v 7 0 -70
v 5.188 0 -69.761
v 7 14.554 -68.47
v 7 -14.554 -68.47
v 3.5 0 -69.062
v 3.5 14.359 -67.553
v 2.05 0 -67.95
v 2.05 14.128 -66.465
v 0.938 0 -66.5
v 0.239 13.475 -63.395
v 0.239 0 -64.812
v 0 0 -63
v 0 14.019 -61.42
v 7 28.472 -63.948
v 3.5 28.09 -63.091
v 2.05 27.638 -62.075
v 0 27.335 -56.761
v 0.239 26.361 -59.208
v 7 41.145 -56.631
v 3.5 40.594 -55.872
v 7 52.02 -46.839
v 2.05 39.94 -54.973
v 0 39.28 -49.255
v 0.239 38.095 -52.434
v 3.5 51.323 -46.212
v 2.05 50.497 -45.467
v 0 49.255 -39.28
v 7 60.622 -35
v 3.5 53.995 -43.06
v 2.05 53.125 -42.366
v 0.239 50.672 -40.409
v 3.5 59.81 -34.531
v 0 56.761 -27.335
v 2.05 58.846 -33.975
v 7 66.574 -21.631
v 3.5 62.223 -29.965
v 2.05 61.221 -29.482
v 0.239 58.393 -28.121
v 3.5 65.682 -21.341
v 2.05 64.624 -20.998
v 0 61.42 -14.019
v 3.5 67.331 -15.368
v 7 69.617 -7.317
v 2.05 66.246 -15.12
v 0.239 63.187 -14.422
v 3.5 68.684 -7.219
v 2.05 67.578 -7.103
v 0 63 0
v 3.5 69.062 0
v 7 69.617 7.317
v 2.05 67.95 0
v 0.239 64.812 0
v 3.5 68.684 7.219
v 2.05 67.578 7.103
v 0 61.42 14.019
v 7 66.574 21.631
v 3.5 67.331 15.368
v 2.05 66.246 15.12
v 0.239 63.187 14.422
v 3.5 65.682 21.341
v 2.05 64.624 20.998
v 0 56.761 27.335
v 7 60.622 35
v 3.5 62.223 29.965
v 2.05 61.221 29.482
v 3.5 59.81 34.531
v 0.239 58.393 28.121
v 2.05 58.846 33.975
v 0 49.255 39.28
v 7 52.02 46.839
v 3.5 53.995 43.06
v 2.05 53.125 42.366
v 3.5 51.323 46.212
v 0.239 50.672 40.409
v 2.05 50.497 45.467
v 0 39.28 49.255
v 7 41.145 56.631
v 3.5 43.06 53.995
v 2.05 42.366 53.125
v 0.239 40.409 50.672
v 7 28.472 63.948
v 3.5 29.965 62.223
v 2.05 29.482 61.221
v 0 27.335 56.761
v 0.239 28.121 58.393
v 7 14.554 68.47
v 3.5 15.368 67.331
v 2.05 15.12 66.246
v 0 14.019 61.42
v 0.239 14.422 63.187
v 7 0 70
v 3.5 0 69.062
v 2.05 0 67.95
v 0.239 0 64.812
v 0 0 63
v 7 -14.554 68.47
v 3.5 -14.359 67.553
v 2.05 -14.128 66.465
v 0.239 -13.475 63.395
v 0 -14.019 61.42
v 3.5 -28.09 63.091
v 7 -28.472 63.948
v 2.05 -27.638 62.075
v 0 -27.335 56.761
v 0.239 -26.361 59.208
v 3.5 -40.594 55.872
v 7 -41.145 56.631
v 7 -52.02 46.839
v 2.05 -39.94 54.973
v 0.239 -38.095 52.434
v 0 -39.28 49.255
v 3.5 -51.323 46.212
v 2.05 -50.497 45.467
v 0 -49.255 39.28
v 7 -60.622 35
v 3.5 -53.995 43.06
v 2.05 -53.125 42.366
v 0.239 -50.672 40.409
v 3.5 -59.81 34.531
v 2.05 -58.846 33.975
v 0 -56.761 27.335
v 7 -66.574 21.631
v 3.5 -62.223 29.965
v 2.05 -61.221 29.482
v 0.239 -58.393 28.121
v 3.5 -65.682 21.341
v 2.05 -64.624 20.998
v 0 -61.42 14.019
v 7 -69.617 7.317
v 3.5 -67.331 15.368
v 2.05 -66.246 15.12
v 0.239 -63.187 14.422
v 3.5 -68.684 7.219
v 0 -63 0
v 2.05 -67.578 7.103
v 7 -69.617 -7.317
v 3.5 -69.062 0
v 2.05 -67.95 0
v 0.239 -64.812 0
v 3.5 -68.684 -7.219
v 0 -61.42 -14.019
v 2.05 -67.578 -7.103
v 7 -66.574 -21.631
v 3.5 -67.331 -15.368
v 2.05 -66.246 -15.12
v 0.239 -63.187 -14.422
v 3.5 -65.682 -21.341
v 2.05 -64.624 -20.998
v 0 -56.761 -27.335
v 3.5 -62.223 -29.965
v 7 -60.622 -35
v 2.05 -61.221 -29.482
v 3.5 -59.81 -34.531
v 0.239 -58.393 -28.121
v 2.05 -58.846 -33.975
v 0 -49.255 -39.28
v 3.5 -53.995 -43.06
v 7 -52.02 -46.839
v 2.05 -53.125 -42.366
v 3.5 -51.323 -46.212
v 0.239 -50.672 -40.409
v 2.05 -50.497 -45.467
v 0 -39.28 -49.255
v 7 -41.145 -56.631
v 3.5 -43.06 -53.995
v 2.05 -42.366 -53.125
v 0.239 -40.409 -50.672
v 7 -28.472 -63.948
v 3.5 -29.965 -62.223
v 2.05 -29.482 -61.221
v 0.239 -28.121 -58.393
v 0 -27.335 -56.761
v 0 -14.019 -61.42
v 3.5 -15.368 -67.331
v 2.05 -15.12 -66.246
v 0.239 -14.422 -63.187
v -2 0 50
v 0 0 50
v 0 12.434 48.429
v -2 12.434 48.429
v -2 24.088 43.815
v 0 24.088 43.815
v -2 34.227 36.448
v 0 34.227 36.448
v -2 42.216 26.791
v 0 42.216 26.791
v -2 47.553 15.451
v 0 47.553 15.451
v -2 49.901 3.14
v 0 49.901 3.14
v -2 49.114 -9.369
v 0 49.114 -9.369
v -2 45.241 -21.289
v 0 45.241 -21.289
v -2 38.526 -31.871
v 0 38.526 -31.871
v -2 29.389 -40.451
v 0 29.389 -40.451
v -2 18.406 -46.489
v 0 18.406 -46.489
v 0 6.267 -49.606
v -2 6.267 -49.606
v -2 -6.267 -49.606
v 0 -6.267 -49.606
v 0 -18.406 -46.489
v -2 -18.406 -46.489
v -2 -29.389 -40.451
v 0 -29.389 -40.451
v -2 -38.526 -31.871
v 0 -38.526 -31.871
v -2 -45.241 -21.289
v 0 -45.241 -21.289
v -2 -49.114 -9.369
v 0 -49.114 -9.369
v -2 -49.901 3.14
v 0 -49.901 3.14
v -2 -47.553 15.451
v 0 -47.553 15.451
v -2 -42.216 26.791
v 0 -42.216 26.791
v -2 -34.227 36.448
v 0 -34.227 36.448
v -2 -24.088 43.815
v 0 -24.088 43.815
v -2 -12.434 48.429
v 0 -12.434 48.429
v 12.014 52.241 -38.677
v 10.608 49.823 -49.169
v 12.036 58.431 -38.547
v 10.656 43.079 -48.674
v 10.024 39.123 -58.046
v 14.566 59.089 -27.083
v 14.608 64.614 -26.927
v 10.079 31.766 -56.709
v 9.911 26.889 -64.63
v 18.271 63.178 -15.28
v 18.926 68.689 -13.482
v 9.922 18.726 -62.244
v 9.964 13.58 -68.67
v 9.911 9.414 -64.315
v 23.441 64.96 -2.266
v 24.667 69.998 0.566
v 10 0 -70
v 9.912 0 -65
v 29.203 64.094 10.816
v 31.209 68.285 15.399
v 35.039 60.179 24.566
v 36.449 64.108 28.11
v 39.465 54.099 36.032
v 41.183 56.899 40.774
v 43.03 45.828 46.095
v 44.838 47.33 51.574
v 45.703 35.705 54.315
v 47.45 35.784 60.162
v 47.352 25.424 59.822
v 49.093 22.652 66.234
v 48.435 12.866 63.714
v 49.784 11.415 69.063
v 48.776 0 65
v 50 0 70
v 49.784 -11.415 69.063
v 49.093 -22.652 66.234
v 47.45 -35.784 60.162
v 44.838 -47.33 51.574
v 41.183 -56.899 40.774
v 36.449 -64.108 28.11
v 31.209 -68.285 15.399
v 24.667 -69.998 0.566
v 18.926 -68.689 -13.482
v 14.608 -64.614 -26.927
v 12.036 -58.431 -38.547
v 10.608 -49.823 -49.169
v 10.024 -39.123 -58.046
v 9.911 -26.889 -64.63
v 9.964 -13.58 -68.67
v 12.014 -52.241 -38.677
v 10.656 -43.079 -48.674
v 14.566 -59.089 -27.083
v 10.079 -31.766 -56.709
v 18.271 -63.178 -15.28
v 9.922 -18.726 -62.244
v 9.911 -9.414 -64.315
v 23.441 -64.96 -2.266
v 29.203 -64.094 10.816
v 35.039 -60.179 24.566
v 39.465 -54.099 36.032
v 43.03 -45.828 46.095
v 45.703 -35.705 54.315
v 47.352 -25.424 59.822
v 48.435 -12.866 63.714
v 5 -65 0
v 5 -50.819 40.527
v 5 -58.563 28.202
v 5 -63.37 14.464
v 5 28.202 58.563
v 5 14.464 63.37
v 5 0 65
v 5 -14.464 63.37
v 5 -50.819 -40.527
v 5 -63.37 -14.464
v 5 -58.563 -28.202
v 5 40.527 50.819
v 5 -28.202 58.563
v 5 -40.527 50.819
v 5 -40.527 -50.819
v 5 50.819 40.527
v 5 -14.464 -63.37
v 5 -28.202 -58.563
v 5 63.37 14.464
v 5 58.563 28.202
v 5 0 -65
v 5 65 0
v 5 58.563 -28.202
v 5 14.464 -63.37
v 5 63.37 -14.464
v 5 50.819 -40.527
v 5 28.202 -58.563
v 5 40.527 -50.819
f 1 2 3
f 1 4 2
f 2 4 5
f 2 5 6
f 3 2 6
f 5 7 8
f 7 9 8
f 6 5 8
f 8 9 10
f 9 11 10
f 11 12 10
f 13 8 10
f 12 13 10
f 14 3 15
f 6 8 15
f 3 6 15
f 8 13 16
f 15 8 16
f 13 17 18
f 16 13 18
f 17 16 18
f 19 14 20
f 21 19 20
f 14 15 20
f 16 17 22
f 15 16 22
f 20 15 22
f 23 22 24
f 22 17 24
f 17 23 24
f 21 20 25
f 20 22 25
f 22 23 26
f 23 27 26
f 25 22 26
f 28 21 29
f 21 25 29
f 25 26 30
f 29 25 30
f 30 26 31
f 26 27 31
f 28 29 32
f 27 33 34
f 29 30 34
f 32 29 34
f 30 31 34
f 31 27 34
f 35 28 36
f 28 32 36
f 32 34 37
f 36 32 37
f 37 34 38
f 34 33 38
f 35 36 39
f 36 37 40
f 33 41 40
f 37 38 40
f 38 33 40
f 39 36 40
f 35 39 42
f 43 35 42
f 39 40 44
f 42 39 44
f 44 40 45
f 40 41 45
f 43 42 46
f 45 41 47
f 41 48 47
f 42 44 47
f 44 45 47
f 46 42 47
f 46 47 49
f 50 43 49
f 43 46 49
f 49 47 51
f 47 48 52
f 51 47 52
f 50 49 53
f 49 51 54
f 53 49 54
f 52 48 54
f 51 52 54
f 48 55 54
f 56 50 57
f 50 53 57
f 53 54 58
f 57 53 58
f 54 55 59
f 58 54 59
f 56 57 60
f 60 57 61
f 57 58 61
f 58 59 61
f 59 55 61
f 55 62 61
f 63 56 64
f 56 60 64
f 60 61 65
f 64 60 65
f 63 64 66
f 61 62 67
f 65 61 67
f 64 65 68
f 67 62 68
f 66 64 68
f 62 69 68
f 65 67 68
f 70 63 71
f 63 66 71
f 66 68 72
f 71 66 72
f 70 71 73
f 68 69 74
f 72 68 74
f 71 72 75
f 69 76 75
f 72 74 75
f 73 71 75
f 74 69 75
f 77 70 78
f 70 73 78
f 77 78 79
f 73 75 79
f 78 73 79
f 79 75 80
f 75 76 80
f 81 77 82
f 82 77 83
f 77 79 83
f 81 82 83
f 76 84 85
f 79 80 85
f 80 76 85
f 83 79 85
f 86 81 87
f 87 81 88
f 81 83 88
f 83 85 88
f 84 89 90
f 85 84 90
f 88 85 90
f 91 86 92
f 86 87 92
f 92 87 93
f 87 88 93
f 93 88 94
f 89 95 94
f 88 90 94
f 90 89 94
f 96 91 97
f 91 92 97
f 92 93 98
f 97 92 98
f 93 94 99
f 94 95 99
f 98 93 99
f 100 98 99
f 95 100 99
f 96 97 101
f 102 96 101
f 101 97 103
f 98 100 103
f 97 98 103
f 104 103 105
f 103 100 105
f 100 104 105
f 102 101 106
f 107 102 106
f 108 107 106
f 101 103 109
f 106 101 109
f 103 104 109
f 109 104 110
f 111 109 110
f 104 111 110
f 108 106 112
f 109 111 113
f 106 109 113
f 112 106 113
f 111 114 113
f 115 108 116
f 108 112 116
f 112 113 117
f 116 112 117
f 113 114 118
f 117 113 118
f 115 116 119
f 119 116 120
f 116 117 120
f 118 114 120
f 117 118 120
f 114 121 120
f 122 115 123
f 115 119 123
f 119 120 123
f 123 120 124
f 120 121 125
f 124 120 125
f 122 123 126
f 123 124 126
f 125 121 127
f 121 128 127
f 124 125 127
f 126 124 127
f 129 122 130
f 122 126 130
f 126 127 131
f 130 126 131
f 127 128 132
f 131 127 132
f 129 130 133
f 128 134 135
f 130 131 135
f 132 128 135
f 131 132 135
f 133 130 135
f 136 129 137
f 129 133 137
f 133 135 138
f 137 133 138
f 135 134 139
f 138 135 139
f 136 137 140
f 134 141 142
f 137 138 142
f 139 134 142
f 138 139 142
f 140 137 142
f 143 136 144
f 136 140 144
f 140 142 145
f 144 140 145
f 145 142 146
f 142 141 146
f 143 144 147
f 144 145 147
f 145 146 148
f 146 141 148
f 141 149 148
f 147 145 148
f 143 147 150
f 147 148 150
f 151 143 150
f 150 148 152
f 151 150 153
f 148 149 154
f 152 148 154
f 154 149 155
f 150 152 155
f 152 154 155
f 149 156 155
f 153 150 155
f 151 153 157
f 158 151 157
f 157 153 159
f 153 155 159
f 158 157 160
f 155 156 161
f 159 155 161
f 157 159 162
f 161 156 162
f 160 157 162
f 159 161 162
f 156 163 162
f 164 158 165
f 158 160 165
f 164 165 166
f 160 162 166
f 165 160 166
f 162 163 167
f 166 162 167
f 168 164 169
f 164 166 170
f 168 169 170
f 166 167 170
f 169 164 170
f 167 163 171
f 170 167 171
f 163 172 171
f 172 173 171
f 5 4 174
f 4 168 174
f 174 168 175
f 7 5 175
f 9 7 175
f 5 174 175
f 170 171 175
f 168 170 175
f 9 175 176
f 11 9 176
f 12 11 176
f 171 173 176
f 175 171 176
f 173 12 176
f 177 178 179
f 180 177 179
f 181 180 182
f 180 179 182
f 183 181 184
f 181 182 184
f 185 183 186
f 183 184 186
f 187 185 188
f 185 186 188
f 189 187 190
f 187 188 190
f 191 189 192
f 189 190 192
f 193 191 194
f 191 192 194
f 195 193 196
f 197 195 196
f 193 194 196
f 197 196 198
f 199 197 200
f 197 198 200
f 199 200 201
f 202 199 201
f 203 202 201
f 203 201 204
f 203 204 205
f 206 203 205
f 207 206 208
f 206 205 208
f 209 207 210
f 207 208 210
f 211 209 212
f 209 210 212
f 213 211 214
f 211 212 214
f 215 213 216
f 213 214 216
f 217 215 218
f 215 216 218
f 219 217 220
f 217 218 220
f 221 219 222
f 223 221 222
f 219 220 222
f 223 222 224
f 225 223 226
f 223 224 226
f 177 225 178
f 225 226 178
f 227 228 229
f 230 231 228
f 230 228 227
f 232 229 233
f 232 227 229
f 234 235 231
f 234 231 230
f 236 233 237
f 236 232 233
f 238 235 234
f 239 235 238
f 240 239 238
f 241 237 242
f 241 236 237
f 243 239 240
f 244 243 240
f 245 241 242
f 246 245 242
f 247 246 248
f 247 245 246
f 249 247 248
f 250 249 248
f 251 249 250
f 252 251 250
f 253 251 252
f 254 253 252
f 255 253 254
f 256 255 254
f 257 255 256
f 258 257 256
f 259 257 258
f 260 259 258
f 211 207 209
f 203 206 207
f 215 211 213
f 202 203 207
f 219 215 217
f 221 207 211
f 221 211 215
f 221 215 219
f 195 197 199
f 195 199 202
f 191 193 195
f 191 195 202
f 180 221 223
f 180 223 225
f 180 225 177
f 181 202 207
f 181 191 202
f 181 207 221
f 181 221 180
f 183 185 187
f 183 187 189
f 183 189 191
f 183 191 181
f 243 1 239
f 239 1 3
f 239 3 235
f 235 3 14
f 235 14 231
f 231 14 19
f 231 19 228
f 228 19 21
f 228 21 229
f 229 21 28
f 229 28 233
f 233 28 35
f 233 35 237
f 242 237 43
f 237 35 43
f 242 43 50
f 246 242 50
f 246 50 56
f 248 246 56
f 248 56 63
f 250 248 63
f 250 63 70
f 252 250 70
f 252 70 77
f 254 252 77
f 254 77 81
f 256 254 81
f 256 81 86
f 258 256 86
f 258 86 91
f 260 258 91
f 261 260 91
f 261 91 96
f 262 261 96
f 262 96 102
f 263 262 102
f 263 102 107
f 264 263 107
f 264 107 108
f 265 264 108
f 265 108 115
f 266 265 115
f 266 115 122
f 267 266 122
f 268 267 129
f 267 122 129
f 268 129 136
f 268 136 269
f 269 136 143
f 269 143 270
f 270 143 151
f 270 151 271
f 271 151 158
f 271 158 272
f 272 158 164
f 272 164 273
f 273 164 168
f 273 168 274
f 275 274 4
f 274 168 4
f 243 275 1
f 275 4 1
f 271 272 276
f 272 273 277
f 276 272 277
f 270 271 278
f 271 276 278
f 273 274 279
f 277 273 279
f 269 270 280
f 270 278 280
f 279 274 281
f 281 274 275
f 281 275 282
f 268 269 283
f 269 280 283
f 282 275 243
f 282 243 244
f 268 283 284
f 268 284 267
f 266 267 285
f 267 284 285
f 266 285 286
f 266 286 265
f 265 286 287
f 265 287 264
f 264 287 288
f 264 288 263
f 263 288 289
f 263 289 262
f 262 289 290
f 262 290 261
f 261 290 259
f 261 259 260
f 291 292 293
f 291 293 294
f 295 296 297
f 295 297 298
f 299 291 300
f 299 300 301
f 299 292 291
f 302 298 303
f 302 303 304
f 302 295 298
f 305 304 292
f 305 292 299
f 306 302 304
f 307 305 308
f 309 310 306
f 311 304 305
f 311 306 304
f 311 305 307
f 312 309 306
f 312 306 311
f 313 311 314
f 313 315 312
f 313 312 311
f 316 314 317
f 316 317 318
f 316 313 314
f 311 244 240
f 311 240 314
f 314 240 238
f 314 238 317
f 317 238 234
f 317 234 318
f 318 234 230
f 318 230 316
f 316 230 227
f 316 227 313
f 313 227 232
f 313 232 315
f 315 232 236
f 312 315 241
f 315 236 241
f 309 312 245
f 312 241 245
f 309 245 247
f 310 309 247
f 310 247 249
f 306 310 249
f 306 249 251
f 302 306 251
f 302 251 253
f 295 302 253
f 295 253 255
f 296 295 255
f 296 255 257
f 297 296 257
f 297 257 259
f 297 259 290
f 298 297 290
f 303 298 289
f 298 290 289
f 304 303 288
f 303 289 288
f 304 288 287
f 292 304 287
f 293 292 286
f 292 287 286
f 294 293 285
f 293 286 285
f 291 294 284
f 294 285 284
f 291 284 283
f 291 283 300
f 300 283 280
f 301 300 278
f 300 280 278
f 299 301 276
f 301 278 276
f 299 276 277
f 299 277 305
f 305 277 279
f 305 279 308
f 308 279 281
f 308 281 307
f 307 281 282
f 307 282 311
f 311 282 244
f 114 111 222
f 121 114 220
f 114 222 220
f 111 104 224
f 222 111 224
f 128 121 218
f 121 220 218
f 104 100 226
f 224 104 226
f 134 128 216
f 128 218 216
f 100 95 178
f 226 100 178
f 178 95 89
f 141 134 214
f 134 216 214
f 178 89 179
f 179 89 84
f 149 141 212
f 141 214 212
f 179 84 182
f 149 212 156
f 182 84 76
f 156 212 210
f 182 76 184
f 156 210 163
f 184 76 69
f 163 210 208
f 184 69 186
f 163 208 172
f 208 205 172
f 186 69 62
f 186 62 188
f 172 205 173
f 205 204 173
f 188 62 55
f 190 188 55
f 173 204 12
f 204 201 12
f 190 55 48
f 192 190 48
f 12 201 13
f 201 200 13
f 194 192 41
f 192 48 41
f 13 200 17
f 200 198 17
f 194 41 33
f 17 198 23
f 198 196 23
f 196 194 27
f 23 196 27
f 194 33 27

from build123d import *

# Parameters (mm, degrees)
SKETCH1_R           = 70
BOSS_EXTRUDE1_DEPTH = 50
SKETCH3_R           = 65
CUT_EXTRUDE1_DEPTH  = 45
CUT_EXTRUDE2_DEPTH  = 82.5
FILLET2_R           = 7
SKETCH5_R           = 50
BOSS_EXTRUDE2_DEPTH = 2


with BuildPart() as part:
    # Sketch1 → Boss-Extrude1 (new body)
    with BuildSketch(Plane(origin=(0, 0, 0), x_dir=(0, 0, -1), z_dir=(1, 0, 0))):
        Circle(SKETCH1_R)
    extrude(amount=BOSS_EXTRUDE1_DEPTH)

    # Sketch3 → Cut-Extrude1 (cut)
    with BuildSketch(Plane(origin=(50, 0, 0), x_dir=(0, 0, -1), z_dir=(1, 0, 0))):
        Circle(SKETCH3_R)
    extrude(amount=-CUT_EXTRUDE1_DEPTH, mode=Mode.SUBTRACT)

    # Sketch4 → Cut-Extrude2 (cut, symmetric)
    with BuildSketch(Plane(origin=(0, 0, 0), x_dir=(1, 0, 0), z_dir=(0, 1, 0))):
        with BuildLine():
            Line((50, -70), (50, 70))
            Line((50, 70), (10, 70))
            add(Edge.make_bspline(
                [(10, 70), (8.736205307, 29.113153139), (29.458127412, -5.568528558), (46.811482452, -55.943406632), (50, -70)],
                knots=[0, 0, 0, 0, 0.596241342, 1, 1, 1, 1], degree=3))
        make_face()
    extrude(amount=CUT_EXTRUDE2_DEPTH, both=True, mode=Mode.SUBTRACT)

    # Fillet2
    fillet2_edges = [part.edges().sort_by_distance(p)[0] for p in [
        (0, 0, 70),
    ]]
    fillet(fillet2_edges, radius=FILLET2_R)

    # Sketch5 → Boss-Extrude2 (add)
    with BuildSketch(Plane.ZY):
        Circle(SKETCH5_R)
    extrude(amount=BOSS_EXTRUDE2_DEPTH)


solid = part.part
